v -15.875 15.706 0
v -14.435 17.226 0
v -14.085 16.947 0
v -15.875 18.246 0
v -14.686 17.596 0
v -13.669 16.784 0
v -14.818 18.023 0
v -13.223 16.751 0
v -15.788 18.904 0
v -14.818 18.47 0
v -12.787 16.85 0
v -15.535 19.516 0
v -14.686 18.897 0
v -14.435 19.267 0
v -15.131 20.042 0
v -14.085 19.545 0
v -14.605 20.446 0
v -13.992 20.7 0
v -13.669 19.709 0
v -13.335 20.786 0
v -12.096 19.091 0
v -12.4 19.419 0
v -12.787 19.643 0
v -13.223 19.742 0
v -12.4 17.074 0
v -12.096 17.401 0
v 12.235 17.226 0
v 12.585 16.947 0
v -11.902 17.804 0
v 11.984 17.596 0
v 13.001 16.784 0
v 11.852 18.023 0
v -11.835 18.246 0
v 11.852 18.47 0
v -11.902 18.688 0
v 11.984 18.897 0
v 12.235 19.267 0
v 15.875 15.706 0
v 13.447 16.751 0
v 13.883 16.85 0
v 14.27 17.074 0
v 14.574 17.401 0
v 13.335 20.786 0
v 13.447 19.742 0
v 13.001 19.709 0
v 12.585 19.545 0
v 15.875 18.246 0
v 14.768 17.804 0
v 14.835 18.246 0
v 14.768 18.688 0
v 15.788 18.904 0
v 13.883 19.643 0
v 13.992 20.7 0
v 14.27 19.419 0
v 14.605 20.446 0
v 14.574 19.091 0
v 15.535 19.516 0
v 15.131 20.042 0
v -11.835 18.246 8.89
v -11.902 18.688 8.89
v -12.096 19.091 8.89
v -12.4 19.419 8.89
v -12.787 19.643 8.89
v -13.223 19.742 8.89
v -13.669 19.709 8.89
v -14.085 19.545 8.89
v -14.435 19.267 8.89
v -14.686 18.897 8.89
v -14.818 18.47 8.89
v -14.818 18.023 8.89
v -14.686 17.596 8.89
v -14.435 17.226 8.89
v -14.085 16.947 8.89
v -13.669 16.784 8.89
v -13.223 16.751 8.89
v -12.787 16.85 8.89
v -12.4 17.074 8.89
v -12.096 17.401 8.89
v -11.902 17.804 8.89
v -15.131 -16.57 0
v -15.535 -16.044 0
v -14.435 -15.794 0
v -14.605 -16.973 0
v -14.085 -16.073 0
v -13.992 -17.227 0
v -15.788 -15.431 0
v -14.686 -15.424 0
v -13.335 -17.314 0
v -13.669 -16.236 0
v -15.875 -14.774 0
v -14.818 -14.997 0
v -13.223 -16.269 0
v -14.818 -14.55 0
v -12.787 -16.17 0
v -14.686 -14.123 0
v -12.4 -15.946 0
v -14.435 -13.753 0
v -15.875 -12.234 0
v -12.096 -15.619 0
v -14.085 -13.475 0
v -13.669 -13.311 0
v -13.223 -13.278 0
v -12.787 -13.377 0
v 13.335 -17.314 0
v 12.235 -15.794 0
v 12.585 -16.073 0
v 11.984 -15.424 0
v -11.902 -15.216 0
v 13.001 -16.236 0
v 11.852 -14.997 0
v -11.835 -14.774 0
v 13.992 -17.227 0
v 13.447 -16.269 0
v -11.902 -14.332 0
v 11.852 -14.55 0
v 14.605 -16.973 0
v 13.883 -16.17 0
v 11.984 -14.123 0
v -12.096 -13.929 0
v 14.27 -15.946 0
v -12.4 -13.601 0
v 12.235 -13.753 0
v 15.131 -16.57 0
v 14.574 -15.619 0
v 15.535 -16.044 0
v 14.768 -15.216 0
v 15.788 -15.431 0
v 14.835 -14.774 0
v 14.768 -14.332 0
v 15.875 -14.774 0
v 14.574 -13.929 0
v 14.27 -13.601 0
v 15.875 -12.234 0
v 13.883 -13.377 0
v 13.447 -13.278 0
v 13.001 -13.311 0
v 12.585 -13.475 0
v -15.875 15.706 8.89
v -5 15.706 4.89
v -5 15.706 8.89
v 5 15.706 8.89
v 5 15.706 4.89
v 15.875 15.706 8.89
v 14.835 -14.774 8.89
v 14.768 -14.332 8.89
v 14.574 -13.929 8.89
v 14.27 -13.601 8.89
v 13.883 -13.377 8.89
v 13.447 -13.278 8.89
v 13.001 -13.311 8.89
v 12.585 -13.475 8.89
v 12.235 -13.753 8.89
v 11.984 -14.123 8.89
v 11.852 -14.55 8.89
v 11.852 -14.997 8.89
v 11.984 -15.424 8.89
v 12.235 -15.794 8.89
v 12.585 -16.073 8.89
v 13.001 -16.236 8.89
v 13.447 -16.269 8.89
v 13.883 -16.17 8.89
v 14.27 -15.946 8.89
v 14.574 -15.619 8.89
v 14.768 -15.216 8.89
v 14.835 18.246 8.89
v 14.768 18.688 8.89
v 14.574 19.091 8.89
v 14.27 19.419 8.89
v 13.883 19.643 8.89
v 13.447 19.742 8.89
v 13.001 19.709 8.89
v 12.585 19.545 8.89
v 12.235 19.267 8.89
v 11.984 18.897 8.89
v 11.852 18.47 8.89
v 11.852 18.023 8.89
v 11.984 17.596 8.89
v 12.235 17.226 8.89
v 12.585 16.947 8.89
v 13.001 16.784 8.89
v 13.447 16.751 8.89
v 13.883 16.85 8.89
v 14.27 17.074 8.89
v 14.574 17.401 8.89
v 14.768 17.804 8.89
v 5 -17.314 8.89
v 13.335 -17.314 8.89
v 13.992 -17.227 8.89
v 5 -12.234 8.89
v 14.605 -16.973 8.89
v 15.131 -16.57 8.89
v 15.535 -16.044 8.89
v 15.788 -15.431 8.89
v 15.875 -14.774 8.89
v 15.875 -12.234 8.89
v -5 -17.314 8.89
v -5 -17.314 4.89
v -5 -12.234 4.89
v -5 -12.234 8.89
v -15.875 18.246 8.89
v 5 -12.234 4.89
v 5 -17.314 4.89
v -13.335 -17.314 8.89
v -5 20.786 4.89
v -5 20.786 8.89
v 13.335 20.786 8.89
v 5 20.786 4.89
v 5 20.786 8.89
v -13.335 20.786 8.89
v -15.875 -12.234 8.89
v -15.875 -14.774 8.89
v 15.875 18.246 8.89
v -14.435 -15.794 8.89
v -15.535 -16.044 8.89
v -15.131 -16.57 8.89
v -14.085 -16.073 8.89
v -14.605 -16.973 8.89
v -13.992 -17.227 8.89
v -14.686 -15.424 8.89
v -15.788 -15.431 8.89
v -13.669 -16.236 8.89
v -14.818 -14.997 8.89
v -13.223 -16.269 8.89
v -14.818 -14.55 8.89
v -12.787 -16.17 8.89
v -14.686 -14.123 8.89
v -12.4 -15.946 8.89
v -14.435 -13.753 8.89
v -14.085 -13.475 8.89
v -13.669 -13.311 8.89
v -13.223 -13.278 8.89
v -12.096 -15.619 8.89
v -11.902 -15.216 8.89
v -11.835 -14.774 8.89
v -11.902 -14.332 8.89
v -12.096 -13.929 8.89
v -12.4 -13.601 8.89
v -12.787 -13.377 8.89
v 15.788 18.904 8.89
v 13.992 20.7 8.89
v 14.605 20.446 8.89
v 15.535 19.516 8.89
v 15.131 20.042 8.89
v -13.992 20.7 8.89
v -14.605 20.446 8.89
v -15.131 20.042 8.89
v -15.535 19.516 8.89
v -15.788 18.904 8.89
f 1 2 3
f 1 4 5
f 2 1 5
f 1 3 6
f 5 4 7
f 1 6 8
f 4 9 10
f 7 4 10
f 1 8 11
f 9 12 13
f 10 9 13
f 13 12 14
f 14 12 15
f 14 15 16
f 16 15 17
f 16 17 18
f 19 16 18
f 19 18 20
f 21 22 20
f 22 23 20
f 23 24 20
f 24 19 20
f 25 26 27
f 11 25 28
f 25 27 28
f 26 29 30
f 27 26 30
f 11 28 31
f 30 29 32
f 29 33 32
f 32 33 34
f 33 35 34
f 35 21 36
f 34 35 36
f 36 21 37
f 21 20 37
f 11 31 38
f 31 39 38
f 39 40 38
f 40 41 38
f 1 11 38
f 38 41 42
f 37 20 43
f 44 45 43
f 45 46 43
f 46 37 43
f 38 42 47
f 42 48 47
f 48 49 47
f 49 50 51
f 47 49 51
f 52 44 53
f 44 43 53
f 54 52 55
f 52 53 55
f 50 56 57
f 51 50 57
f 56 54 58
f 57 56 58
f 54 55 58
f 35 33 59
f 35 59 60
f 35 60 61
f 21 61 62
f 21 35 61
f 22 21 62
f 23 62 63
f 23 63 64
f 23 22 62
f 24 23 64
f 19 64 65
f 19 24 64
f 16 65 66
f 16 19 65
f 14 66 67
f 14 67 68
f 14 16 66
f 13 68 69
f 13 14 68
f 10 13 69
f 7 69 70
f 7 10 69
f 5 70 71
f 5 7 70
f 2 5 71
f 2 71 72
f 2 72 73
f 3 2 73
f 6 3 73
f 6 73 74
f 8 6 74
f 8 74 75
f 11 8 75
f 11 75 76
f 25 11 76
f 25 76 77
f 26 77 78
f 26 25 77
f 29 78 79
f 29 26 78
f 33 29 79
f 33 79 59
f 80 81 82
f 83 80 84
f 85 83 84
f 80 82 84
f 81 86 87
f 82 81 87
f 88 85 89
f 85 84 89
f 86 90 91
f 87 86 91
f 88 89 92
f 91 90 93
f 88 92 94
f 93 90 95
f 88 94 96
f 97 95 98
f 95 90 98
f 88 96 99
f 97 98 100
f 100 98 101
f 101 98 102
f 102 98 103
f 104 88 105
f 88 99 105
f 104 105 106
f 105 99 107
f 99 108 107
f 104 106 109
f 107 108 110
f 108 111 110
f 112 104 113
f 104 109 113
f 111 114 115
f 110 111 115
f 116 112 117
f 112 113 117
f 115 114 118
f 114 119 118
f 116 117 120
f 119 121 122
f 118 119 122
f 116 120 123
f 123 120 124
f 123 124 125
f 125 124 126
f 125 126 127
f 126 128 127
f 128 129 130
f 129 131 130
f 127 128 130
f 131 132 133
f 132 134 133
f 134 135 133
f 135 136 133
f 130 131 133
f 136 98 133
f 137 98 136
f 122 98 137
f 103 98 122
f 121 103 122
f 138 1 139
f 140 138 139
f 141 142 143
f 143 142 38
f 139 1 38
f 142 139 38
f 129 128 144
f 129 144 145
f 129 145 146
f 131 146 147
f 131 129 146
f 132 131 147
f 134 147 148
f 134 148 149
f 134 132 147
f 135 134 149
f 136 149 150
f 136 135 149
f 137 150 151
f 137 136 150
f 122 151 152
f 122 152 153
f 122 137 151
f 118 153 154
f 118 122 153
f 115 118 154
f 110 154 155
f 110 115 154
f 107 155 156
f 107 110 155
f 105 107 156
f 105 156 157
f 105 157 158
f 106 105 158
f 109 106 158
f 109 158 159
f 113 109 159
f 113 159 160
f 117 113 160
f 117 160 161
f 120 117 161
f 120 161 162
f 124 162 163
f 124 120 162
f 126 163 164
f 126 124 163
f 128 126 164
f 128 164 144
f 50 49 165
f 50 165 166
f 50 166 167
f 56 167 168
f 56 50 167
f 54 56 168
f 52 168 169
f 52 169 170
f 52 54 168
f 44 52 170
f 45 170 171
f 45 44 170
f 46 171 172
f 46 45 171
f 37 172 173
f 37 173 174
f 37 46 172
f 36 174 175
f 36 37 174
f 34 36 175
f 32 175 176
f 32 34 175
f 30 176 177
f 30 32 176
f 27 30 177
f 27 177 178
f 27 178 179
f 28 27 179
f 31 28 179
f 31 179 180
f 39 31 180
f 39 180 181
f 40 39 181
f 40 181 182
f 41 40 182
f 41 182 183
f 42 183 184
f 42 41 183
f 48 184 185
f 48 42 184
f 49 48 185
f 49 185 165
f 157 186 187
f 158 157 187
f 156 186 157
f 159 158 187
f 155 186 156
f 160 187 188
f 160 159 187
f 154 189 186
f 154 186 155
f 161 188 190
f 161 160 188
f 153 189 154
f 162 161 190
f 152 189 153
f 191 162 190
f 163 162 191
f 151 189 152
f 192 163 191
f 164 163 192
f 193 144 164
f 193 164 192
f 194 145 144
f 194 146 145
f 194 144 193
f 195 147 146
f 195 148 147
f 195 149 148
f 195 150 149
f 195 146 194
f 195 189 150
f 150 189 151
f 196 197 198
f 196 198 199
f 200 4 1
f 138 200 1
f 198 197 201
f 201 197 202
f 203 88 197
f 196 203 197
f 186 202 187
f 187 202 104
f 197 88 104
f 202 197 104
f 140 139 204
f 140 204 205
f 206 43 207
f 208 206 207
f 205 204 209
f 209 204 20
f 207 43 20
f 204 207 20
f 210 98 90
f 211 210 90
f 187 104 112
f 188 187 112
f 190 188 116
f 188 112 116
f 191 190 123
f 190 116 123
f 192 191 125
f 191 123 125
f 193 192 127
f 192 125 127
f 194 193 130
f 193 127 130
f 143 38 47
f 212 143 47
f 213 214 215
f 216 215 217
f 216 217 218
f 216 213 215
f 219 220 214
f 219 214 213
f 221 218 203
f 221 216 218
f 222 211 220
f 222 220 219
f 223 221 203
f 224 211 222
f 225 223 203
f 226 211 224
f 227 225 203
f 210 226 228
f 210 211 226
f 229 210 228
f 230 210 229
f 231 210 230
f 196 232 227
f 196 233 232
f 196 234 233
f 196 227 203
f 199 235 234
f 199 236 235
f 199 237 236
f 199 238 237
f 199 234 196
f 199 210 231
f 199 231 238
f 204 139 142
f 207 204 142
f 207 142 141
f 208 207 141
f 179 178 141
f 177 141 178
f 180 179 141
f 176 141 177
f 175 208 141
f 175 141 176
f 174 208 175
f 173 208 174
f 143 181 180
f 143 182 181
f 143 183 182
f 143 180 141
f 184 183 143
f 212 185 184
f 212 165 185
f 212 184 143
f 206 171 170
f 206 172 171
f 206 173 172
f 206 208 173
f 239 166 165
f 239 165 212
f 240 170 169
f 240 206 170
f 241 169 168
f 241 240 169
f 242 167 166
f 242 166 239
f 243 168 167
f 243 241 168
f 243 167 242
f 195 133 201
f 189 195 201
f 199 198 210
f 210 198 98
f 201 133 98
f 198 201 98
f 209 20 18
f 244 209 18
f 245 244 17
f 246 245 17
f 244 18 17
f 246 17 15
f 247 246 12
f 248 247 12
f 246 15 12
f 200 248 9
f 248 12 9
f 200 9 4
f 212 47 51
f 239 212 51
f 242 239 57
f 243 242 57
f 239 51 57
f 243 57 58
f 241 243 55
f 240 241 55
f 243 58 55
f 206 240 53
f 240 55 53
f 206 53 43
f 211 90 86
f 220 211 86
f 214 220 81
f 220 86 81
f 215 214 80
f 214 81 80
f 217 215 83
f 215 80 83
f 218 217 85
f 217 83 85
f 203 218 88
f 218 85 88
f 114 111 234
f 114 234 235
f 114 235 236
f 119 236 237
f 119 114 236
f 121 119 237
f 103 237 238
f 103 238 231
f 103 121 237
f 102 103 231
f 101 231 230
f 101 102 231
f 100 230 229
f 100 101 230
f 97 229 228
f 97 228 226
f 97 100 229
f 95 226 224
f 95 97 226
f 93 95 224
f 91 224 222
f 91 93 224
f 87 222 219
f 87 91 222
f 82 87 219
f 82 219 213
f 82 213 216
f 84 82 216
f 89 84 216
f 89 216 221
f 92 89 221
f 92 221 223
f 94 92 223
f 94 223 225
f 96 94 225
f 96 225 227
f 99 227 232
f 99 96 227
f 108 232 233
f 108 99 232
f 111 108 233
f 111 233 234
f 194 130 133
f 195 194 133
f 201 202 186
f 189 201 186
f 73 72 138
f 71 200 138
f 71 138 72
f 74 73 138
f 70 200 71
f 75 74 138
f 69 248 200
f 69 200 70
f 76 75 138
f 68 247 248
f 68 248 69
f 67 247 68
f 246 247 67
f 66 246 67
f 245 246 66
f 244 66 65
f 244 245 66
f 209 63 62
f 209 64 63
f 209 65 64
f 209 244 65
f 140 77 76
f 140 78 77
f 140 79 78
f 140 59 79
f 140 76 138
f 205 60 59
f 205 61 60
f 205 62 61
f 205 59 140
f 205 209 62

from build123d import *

# Parameters (mm, degrees)
F0_R     = 1.5
F1_DEPTH = 8.89
F2_W     = 10
F2_H     = 4
F3_DEPTH = 38.101


with BuildPart() as f1:
    # F0 (on Top) → F1 (new body)
    with BuildSketch(Plane.XY):
        with BuildLine():
            Line((-15.875, 15.706331), (15.875, 15.706331))
            Line((15.875, 15.706331), (15.875, 18.246331))
            ThreePointArc((15.875, 18.246331), (15.131051, 20.042382), (13.335, 20.786331))
            Line((13.335, 20.786331), (-13.335, 20.786331))
            ThreePointArc((-13.335, 20.786331), (-15.131051, 20.042382), (-15.875, 18.246331))
            Line((-15.875, 18.246331), (-15.875, 15.706331))
        make_face()
        with Locations((-13.335, 18.246331)):
            Circle(F0_R, mode=Mode.SUBTRACT)
        with Locations((13.335, 18.246331)):
            Circle(F0_R, mode=Mode.SUBTRACT)
        with BuildLine():
            Line((-13.335, -17.313669), (13.335, -17.313669))
            ThreePointArc((13.335, -17.313669), (15.131051, -16.569721), (15.875, -14.773669))
            Line((15.875, -14.773669), (15.875, -12.233669))
            Line((15.875, -12.233669), (-15.875, -12.233669))
            Line((-15.875, -12.233669), (-15.875, -14.773669))
            ThreePointArc((-15.875, -14.773669), (-15.131051, -16.569721), (-13.335, -17.313669))
        make_face()
        with Locations((-13.335, -14.773669)):
            Circle(F0_R, mode=Mode.SUBTRACT)
        with Locations((13.335, -14.773669)):
            Circle(F0_R, mode=Mode.SUBTRACT)
    extrude(amount=F1_DEPTH)

    # F2 (on face) → F3 (cut, through all)
    with BuildSketch(Plane.XZ.offset(17.313669)):
        with Locations((0, 6.89)):
            Rectangle(F2_W, F2_H)
    extrude(amount=-F3_DEPTH, mode=Mode.SUBTRACT)


solid = f1.part
